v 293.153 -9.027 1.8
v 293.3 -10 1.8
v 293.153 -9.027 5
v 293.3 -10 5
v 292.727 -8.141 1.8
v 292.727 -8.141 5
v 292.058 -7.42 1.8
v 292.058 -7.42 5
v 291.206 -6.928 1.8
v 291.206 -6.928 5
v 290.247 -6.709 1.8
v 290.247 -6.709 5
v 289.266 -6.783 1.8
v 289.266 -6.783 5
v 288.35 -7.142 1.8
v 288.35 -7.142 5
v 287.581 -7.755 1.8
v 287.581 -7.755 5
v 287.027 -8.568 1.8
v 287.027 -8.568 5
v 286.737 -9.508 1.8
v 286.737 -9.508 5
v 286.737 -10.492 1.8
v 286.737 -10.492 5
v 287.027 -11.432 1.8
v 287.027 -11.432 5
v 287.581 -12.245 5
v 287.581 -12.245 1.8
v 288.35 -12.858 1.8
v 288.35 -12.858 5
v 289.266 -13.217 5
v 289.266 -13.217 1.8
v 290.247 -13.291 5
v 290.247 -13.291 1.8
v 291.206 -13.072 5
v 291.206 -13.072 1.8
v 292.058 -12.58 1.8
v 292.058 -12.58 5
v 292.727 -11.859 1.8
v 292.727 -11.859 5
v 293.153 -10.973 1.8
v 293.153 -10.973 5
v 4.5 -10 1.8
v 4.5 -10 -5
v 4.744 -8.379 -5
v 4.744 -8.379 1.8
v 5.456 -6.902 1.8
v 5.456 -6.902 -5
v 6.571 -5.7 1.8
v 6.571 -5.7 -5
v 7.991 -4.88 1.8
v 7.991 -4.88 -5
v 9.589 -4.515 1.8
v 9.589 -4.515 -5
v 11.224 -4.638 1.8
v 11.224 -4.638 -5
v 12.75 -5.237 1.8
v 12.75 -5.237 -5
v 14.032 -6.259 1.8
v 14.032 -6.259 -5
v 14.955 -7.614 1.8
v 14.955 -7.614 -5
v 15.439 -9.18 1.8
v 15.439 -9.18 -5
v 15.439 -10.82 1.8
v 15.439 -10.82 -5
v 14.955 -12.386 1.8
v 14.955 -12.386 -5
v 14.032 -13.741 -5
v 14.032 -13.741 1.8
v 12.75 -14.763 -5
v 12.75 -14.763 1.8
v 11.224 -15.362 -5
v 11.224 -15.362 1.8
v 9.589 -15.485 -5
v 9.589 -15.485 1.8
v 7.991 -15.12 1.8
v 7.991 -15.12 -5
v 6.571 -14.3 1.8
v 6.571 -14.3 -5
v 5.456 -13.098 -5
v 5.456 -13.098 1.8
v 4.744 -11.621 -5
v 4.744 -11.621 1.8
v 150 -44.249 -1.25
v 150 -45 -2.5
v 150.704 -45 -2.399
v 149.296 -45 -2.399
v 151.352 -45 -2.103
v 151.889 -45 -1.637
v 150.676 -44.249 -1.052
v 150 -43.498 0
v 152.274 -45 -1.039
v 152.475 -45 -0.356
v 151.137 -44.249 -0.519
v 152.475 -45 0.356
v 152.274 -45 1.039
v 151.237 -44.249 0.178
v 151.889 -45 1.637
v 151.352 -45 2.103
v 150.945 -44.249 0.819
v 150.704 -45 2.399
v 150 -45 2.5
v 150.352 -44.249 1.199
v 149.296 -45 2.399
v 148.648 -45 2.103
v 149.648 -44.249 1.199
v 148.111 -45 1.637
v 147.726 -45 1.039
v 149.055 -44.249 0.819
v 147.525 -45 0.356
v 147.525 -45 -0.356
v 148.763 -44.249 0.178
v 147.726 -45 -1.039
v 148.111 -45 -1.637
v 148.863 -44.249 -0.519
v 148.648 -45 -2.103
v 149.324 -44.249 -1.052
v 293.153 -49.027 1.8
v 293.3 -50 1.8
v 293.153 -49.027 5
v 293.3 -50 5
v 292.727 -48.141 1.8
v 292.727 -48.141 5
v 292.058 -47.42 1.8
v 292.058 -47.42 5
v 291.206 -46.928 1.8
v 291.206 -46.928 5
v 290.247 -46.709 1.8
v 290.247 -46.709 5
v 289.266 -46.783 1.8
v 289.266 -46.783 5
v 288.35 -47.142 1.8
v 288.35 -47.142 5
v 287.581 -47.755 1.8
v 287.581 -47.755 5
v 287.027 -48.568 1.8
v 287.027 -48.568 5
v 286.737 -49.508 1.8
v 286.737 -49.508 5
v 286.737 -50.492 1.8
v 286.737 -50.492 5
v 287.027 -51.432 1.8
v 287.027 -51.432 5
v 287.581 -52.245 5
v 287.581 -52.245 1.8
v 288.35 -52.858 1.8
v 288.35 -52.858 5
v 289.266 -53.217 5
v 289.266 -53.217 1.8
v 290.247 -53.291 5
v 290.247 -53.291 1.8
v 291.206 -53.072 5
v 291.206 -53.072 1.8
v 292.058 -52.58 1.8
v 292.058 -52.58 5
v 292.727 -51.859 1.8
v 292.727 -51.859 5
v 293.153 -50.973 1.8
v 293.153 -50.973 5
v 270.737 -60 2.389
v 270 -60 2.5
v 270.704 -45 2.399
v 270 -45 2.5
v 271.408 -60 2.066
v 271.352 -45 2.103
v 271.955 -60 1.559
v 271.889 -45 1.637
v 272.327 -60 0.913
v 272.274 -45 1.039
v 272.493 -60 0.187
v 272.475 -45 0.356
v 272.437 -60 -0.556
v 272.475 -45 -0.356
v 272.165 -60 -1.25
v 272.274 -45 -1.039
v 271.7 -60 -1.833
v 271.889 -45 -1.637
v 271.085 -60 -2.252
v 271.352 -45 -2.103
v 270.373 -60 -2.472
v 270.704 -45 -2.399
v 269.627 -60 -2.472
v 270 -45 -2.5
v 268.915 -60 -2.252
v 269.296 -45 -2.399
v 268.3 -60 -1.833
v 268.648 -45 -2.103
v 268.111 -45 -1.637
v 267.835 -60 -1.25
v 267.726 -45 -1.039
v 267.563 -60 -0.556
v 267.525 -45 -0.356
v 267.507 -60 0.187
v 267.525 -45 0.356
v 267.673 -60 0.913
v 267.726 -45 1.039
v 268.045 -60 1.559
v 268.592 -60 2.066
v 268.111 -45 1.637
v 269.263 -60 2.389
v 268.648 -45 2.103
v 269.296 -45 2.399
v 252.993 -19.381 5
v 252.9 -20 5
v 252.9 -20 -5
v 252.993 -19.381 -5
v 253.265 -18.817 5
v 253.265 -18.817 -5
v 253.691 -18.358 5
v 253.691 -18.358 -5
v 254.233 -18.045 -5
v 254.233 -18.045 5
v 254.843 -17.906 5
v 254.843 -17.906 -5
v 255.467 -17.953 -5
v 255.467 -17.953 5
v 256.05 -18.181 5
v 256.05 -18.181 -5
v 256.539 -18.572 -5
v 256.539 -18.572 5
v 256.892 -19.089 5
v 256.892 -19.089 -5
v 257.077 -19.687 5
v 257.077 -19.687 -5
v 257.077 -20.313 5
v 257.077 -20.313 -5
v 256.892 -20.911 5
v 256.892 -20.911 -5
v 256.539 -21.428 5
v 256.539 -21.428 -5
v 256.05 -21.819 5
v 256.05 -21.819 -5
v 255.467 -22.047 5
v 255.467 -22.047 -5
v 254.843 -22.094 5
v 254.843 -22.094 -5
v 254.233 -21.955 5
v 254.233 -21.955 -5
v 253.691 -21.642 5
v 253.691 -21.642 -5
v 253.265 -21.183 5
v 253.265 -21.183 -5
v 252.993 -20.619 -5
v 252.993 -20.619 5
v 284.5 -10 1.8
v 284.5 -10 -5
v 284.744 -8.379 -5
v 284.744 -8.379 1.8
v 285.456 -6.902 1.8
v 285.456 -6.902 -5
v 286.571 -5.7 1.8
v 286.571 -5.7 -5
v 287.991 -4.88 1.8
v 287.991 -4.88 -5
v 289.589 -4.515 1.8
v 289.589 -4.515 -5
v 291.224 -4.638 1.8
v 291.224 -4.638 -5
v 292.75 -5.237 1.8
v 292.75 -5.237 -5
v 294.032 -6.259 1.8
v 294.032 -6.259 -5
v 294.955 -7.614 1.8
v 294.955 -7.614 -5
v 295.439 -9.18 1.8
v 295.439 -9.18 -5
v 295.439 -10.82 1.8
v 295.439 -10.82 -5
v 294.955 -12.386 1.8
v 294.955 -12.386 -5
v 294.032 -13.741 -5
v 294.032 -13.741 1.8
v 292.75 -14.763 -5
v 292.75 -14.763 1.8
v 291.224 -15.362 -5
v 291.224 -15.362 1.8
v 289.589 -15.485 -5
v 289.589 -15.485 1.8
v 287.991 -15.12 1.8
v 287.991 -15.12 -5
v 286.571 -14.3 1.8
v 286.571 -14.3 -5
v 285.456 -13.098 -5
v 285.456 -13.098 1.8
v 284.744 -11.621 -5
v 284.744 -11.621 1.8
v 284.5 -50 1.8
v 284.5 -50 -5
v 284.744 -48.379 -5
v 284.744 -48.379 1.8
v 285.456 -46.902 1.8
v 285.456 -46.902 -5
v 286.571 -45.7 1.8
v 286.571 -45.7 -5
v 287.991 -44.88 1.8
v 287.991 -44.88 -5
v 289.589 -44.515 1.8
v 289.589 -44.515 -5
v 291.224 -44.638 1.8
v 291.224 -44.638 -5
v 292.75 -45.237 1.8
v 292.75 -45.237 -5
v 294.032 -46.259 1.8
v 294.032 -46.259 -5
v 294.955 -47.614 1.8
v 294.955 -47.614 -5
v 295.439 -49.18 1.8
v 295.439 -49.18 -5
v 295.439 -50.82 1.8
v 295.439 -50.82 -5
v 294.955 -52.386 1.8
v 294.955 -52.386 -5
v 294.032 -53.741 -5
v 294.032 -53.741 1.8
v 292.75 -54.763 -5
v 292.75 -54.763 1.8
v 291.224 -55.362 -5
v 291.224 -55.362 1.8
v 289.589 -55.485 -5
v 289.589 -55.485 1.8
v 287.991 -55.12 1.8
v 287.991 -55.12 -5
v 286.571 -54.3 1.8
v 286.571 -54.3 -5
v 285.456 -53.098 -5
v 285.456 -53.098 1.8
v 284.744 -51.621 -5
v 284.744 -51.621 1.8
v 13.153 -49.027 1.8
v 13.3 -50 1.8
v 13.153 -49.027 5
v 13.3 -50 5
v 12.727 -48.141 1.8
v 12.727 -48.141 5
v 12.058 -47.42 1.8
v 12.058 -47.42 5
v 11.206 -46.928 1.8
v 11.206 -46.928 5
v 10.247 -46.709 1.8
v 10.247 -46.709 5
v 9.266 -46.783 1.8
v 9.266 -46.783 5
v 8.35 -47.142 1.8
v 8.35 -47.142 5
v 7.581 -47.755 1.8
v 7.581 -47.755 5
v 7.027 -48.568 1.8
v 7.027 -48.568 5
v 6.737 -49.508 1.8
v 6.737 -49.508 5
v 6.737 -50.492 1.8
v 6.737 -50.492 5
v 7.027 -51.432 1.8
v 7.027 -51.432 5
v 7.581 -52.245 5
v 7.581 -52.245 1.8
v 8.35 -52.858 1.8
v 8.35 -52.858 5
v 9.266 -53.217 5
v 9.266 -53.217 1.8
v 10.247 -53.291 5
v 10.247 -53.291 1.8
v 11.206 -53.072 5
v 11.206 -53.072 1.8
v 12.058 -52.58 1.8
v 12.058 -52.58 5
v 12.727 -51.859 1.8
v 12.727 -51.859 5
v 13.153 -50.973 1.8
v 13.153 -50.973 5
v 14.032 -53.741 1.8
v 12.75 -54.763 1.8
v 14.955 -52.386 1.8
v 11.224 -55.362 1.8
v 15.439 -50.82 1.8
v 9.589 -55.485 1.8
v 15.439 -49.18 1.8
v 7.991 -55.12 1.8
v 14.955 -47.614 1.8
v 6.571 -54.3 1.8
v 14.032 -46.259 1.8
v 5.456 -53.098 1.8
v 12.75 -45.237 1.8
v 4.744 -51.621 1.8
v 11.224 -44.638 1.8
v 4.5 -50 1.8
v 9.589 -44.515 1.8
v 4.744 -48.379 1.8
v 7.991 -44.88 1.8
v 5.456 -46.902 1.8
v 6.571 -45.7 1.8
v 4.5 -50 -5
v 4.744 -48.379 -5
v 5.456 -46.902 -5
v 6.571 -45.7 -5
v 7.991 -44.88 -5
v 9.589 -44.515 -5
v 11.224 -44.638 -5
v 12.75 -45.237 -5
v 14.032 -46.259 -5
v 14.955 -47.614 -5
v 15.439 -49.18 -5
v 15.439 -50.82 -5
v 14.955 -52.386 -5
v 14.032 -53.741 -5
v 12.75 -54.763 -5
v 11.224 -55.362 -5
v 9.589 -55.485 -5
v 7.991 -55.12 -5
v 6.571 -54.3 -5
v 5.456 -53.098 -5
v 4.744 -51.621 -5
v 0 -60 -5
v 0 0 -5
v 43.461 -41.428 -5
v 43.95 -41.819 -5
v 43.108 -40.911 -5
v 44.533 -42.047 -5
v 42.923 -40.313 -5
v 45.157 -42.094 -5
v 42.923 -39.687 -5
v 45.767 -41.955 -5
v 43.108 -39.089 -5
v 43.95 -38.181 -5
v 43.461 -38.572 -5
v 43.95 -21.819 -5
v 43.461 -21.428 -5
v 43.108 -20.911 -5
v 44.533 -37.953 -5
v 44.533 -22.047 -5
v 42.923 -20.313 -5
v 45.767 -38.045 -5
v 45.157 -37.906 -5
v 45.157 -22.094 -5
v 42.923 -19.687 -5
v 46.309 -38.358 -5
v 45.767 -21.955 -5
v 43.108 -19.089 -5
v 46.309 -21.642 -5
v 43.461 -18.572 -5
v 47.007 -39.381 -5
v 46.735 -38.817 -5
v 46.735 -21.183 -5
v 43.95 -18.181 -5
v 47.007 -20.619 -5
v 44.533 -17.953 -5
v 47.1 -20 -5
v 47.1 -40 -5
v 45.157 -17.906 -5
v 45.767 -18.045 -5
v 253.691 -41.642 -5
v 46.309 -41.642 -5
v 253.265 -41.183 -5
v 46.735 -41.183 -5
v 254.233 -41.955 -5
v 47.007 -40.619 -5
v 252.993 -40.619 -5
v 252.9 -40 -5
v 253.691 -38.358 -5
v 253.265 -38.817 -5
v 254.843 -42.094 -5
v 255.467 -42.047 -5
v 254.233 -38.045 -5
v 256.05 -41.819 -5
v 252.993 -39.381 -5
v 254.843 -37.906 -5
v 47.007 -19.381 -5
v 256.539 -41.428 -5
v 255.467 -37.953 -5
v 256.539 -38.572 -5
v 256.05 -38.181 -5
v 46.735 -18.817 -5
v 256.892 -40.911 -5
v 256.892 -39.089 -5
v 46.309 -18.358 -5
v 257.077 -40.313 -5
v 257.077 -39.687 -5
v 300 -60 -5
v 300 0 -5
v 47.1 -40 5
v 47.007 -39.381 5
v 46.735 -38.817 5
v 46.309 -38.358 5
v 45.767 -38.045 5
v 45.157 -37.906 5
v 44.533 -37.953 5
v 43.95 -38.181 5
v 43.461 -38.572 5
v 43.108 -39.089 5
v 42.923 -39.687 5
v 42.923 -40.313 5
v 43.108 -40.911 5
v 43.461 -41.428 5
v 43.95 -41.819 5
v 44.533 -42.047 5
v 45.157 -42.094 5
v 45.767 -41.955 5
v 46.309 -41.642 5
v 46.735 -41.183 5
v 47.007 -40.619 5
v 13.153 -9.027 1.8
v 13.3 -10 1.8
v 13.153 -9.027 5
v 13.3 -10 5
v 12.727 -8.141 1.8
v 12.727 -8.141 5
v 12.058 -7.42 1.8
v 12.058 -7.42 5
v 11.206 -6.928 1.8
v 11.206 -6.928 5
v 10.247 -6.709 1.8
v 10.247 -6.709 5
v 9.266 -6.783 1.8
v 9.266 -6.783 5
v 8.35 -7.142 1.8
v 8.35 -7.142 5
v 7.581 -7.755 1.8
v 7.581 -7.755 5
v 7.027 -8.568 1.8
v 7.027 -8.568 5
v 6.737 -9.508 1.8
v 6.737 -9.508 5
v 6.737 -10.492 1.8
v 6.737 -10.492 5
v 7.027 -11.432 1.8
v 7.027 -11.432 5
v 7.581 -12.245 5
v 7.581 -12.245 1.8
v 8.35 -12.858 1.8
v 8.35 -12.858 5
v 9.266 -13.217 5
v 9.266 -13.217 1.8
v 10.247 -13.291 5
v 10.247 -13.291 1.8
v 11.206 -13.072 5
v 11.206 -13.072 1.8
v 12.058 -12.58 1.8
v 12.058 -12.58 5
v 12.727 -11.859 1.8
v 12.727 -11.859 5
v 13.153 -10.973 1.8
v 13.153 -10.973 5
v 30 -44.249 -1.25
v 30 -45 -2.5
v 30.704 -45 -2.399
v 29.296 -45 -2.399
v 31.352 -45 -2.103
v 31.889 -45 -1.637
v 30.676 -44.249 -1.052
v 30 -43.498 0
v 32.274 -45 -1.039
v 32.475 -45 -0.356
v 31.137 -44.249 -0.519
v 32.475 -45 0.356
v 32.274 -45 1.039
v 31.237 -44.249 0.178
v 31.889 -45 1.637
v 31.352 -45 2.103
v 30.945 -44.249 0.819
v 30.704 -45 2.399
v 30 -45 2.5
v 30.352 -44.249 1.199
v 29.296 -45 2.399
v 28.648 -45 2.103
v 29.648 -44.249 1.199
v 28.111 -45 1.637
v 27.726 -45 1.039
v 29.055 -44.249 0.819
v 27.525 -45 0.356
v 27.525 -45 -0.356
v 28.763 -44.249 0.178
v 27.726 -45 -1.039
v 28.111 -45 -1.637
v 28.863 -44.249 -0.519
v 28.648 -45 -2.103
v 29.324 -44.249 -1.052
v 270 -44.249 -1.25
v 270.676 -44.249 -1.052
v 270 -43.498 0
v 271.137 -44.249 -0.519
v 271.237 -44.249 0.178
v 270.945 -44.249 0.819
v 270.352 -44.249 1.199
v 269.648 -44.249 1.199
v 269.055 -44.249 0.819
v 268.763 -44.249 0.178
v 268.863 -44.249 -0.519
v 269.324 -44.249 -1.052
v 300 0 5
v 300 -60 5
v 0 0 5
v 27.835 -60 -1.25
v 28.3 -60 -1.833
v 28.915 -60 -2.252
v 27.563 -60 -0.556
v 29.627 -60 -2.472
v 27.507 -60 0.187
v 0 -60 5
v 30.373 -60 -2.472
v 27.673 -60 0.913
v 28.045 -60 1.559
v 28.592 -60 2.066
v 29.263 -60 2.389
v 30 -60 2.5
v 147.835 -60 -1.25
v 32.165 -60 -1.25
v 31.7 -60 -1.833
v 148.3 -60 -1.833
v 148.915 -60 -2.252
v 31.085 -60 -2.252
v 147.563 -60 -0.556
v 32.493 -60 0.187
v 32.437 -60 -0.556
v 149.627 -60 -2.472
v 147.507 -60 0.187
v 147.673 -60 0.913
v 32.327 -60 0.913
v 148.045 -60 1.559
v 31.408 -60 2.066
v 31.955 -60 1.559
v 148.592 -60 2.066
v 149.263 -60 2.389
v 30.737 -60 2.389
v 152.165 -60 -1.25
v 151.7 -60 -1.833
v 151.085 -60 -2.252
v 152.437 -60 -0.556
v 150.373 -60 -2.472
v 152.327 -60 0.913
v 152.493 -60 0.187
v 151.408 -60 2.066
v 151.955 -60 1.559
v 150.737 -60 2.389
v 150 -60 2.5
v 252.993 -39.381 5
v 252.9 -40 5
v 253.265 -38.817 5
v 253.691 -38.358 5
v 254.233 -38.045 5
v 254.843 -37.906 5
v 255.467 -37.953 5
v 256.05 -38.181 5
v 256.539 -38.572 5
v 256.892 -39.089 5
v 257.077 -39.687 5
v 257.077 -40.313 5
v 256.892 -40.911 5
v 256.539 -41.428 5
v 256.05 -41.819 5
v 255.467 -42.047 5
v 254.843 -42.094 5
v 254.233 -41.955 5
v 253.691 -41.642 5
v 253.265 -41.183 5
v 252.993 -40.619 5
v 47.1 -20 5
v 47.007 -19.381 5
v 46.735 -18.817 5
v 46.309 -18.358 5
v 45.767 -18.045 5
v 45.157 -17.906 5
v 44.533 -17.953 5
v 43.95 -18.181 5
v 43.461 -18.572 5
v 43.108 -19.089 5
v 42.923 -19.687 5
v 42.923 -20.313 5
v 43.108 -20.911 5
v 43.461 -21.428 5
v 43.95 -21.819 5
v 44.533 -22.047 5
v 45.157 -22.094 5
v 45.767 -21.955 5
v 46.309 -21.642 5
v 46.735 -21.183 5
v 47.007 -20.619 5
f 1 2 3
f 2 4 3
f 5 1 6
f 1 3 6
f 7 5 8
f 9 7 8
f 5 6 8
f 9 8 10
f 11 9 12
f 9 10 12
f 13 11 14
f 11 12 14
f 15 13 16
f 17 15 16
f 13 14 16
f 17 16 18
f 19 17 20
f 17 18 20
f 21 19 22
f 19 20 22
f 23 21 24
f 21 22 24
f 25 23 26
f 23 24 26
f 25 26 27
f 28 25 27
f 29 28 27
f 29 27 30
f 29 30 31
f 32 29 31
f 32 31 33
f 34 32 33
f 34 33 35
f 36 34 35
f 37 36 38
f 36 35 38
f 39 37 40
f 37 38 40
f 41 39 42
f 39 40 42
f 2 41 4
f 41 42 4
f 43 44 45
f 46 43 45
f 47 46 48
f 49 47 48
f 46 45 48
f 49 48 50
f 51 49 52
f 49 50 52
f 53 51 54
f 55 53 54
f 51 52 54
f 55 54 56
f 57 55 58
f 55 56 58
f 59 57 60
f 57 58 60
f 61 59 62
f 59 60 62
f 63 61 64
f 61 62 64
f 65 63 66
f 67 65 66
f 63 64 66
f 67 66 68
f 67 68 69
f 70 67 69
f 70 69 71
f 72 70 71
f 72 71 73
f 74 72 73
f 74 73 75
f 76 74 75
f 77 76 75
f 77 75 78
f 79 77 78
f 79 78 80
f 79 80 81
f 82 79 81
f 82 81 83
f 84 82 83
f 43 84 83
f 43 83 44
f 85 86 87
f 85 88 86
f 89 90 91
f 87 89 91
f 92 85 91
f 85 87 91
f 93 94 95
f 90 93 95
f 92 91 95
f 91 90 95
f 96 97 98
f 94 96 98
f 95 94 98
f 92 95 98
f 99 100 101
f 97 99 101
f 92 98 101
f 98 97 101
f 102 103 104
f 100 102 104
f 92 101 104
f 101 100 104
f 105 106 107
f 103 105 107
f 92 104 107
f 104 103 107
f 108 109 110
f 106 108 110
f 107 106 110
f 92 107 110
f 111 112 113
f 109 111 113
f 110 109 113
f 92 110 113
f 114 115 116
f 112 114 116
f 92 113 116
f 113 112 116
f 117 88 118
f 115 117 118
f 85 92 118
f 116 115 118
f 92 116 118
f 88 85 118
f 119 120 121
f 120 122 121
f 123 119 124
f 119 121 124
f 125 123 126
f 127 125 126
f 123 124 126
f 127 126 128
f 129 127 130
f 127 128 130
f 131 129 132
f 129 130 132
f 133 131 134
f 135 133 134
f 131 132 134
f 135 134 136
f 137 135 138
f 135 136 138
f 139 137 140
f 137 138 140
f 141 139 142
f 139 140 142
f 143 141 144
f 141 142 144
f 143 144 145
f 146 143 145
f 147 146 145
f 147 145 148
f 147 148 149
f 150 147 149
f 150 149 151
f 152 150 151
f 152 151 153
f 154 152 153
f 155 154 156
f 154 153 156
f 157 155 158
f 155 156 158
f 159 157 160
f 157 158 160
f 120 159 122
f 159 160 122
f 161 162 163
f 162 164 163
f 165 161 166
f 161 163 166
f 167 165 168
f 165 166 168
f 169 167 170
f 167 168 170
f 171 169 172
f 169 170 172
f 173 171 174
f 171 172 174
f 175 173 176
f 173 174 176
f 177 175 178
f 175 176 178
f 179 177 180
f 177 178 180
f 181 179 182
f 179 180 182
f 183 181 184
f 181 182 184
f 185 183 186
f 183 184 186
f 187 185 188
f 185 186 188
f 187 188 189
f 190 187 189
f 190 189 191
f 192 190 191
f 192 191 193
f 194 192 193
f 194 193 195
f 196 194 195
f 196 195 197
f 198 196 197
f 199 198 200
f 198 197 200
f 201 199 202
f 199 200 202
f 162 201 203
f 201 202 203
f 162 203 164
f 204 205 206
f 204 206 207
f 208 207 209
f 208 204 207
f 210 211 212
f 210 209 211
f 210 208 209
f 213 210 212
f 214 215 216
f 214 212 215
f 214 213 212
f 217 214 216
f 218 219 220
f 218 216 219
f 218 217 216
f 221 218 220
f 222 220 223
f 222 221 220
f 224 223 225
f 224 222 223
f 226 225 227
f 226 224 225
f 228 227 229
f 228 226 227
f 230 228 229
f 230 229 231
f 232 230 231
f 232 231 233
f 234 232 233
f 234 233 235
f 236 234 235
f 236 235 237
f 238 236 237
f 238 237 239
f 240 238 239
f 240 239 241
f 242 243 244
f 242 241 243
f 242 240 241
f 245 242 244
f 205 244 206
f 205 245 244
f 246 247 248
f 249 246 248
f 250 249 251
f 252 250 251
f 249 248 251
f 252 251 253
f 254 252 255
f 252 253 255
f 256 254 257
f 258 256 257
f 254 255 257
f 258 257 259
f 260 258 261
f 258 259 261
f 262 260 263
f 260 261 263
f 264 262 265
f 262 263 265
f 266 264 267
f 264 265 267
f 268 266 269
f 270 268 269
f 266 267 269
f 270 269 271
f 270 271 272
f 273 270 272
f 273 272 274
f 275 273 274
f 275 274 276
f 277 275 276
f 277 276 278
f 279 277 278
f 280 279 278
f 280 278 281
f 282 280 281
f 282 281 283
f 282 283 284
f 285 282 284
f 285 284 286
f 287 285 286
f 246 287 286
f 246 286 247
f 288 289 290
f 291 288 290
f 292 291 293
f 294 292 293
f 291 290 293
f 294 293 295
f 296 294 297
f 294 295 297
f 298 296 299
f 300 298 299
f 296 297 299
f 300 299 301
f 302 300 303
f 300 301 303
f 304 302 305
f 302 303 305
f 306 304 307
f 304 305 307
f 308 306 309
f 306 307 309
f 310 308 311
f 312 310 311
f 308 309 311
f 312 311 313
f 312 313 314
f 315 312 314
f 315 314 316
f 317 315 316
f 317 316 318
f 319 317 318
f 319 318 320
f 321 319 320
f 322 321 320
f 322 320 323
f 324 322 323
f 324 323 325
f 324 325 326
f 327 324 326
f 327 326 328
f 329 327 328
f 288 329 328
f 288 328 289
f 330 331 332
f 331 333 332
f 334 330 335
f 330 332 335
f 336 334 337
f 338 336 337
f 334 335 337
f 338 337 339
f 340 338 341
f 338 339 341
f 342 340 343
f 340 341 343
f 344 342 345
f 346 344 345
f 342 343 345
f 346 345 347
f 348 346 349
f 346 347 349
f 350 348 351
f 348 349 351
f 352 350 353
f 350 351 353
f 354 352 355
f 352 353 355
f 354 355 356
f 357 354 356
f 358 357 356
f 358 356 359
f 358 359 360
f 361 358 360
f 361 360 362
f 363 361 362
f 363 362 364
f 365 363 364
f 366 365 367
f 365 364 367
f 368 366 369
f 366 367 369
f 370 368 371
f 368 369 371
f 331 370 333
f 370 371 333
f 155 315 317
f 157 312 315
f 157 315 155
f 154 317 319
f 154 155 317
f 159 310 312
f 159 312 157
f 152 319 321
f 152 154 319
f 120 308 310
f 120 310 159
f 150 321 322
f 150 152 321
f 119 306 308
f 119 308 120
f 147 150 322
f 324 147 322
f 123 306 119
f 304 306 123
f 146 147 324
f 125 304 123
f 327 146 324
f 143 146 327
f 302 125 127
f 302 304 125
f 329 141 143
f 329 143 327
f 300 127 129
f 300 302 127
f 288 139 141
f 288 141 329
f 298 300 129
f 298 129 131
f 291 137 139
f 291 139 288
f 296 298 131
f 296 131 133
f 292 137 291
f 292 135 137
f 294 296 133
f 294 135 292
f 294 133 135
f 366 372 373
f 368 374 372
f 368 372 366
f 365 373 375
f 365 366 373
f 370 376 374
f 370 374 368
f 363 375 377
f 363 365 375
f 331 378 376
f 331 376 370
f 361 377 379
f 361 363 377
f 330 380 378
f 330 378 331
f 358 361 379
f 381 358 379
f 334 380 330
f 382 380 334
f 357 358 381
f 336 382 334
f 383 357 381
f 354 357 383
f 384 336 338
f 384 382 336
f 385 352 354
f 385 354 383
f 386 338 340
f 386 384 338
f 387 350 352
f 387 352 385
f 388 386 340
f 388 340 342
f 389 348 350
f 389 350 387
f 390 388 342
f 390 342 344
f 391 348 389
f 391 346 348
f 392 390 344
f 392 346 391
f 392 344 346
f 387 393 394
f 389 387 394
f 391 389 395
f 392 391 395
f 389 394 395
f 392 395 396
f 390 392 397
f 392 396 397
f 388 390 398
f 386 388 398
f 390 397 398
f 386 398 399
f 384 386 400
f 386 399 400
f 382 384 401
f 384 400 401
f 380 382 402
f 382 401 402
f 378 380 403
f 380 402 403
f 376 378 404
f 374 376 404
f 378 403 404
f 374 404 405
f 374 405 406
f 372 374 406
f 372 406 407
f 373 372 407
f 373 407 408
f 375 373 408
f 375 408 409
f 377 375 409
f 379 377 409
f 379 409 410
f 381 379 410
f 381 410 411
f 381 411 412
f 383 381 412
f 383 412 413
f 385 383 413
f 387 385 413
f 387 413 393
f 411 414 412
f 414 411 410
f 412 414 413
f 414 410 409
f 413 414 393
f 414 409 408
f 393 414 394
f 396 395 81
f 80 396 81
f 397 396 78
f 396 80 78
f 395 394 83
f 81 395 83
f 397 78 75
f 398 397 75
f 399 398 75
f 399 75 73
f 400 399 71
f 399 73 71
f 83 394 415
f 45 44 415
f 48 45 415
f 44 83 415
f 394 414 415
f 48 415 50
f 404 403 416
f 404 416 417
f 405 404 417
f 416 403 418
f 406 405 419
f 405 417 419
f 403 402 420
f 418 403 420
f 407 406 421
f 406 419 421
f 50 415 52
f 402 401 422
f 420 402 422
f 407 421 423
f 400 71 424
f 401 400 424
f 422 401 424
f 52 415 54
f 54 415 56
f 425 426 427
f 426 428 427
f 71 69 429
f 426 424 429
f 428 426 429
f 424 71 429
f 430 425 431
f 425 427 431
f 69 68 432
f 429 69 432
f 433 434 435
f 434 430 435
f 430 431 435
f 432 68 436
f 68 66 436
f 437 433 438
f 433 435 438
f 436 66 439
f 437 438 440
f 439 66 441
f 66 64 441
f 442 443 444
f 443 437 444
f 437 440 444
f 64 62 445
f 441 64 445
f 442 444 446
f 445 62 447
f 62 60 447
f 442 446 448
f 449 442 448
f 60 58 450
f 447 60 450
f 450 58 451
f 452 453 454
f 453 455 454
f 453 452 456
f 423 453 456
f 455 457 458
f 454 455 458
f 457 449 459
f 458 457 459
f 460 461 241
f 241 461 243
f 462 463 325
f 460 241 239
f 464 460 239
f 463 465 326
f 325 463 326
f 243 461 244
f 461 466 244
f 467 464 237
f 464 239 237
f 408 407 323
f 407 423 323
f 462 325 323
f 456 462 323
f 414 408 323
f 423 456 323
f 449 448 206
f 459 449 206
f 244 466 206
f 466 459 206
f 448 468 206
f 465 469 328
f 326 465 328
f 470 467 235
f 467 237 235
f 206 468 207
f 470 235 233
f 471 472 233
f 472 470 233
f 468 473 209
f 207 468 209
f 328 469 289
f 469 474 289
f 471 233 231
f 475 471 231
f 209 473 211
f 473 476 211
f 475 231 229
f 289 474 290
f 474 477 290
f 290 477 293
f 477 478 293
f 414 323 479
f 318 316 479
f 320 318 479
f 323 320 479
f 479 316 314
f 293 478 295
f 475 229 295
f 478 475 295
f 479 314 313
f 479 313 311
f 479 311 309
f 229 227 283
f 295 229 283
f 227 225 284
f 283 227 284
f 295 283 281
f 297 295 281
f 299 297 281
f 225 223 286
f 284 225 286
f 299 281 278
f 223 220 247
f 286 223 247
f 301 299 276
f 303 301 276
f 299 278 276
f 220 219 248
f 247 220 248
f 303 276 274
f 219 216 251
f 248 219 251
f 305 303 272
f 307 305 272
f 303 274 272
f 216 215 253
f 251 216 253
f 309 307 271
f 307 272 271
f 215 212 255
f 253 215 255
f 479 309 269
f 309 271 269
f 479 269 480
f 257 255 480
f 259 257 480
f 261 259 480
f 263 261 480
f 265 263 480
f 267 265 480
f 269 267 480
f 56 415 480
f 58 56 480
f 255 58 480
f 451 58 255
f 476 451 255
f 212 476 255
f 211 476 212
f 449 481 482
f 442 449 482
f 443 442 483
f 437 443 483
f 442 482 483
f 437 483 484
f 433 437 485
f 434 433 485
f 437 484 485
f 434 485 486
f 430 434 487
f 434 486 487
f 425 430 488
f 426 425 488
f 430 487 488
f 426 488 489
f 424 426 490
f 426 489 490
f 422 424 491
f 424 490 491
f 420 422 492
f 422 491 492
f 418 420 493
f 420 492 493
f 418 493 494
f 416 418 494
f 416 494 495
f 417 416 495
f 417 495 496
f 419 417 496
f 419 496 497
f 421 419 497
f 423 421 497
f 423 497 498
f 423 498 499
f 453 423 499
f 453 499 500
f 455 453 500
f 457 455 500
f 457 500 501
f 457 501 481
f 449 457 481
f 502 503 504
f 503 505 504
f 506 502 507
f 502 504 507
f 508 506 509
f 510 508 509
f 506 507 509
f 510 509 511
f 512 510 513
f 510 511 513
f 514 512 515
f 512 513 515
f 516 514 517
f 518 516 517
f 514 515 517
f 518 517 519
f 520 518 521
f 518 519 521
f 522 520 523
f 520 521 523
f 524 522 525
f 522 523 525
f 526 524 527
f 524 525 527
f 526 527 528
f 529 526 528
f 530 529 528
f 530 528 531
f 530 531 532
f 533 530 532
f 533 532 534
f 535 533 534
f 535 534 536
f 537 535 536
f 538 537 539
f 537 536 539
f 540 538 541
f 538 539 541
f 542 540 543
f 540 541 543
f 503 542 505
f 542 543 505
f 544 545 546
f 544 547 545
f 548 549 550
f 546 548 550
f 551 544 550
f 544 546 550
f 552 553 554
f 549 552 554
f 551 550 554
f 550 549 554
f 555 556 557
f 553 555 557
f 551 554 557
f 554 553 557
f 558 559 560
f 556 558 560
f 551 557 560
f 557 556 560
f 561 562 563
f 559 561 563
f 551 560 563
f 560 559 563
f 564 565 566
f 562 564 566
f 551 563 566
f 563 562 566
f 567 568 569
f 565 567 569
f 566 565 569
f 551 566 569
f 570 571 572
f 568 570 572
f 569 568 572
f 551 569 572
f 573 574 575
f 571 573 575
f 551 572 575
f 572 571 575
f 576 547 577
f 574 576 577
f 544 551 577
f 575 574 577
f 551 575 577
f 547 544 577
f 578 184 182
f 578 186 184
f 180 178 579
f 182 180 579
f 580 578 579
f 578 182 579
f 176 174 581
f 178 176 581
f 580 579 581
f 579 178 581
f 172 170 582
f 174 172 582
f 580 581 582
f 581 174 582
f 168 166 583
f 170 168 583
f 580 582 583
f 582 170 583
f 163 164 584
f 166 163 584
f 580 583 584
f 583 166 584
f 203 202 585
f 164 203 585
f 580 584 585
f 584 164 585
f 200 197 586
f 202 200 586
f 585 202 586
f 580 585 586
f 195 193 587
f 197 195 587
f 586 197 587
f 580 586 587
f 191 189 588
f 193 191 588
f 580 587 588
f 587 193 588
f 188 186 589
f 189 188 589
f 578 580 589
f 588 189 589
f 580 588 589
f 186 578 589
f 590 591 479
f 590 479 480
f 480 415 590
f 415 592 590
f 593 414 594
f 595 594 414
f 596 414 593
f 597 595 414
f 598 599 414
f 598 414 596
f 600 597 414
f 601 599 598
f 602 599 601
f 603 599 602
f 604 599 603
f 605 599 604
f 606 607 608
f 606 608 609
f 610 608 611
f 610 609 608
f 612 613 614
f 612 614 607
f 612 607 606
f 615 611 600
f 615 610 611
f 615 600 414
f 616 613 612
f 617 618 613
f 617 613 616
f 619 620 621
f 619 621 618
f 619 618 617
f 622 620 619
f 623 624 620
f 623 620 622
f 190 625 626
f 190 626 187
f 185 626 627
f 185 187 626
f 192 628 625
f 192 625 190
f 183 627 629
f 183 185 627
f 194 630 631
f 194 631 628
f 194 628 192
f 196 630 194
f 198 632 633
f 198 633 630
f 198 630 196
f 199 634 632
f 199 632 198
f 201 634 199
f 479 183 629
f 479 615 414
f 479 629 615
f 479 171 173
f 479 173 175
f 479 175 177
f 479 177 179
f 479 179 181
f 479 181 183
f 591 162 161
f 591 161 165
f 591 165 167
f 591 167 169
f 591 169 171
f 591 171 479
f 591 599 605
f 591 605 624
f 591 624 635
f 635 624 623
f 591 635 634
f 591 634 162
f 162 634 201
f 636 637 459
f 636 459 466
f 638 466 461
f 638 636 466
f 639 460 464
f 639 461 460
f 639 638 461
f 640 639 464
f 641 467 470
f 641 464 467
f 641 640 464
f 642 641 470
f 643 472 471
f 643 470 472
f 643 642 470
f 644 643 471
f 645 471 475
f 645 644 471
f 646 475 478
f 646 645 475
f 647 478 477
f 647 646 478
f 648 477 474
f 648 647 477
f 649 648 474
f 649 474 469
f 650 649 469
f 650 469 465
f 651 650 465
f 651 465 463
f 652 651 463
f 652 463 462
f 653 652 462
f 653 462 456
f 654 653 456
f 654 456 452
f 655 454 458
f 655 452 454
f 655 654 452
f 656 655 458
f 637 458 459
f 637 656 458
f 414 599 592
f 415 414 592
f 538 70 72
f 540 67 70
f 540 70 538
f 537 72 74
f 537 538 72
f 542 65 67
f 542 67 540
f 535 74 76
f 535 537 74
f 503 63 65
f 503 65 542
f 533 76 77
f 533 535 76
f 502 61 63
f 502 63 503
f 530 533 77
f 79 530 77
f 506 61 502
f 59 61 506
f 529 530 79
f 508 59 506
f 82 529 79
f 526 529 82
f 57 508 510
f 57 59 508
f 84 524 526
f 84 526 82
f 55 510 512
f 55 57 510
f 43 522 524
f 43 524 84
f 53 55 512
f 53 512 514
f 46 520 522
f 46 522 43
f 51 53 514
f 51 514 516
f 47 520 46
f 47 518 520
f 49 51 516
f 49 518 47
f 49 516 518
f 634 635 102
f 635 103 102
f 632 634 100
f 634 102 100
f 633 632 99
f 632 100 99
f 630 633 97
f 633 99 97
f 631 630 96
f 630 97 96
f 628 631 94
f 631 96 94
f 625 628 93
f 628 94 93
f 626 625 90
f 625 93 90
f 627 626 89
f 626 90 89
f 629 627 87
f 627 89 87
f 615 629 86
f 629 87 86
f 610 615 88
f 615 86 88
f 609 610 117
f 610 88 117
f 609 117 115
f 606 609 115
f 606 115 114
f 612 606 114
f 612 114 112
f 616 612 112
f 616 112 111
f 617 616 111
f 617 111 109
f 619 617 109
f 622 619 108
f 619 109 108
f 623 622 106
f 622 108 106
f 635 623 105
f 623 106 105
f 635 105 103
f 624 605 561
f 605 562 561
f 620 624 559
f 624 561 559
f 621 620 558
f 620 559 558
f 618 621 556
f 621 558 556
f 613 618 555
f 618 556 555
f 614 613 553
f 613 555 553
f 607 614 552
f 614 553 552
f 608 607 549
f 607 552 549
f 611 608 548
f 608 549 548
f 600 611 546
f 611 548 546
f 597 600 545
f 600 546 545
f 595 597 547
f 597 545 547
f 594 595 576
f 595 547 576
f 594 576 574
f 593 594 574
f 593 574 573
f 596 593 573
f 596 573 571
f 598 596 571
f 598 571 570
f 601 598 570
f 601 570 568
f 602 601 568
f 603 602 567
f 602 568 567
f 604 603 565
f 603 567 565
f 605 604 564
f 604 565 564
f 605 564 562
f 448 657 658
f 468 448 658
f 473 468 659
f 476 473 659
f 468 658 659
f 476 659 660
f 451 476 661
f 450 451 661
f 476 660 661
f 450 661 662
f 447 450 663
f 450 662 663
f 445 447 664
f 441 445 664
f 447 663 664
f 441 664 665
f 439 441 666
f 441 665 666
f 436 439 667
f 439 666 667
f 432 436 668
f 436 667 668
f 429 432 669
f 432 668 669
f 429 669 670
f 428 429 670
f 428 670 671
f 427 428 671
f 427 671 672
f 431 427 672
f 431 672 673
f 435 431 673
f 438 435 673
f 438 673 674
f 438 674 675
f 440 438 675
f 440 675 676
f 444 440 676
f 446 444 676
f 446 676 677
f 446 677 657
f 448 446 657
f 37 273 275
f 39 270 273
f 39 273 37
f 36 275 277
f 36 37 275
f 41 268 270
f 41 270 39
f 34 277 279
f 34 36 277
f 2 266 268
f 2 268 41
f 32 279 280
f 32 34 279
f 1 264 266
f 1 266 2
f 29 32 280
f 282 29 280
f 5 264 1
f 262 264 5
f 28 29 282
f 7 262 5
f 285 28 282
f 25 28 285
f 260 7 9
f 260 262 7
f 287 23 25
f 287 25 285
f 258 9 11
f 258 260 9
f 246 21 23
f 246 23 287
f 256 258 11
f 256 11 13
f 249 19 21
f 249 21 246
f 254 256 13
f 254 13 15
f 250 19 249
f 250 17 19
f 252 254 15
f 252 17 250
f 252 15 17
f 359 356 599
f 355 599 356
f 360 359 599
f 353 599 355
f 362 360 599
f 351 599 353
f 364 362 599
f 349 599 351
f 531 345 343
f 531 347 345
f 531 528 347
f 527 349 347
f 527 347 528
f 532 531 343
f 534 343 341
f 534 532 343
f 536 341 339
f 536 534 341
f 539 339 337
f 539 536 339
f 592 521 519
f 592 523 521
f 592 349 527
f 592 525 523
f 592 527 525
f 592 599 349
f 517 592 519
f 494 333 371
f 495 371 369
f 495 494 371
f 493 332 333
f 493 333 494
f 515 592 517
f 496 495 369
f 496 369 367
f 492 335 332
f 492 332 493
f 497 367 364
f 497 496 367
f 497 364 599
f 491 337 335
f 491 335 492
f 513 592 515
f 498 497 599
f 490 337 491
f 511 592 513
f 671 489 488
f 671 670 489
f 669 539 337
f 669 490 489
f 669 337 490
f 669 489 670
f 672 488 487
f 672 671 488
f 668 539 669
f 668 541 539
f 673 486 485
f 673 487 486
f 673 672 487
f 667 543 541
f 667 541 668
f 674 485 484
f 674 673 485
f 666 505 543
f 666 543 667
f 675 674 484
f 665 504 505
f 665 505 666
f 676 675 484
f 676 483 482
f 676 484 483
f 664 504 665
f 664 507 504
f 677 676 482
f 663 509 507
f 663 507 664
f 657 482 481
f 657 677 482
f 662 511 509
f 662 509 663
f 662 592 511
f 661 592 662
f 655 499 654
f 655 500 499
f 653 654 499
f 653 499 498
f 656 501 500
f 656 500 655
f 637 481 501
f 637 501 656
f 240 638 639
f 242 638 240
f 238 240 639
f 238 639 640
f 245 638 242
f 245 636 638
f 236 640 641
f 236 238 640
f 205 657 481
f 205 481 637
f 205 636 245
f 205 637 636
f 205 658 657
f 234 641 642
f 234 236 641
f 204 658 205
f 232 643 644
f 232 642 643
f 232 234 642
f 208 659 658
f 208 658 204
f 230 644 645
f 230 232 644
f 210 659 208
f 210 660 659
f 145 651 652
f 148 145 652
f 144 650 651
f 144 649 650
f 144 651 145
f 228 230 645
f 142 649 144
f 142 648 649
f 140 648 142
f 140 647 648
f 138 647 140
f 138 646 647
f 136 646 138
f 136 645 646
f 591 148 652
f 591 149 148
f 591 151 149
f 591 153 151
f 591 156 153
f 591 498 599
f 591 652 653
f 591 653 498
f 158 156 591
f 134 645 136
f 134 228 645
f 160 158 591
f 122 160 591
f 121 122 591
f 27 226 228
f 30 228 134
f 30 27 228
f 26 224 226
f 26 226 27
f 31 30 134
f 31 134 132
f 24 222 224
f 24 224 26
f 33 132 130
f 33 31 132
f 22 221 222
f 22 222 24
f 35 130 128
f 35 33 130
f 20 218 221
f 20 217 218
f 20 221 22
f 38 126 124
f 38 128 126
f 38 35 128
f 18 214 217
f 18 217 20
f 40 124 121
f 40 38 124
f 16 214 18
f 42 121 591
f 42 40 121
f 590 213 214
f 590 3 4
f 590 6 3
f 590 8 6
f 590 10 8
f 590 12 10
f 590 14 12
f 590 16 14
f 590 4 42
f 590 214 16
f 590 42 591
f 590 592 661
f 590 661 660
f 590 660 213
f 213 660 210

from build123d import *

# Parameters (mm, degrees)
SKETCH_1_W                = 300
SKETCH_1_H                = 60
EXTRUDE_1_DEPTH           = 5
HOLE_WIZARD_M6_1_D        = 5
HOLE_WIZARD_M6_1_DEPTH    = 15
HOLE_WIZARD_M6_1_TIP      = 1.502151548
HOLE_WIZARD_1_D           = 6.6
HOLE_WIZARD_1_CBORE_D     = 11
HOLE_WIZARD_1_CBORE_DEPTH = 6.8
HOLE_WIZARD_M5_1_D        = 4.2


with BuildPart() as part:
    # 草图1 → 凸台-拉伸1 (new body, symmetric)
    with BuildSketch(Plane.XY):
        with Locations((150, -30)):
            Rectangle(SKETCH_1_W, SKETCH_1_H)
    extrude(amount=EXTRUDE_1_DEPTH, both=True)

    # M6 螺纹孔1
    with Locations(Plane(origin=(30, -60, 0), x_dir=(0, 0, -1), z_dir=(0, -1, 0))):
        with Locations((0, 0), (0, 240), (0, 120)):
            Hole(HOLE_WIZARD_M6_1_D / 2, depth=HOLE_WIZARD_M6_1_DEPTH)
            with Locations((0, 0, -(HOLE_WIZARD_M6_1_DEPTH + HOLE_WIZARD_M6_1_TIP / 2))):  # 118° drill point
                Cone(0, HOLE_WIZARD_M6_1_D / 2, HOLE_WIZARD_M6_1_TIP, mode=Mode.SUBTRACT)

    # 打孔尺寸(%根据)内六角圆柱头螺钉的类型1 (through all)
    with Locations(Plane(origin=(10, -10, -5), x_dir=(-1, 0, 0), z_dir=(0, 0, -1))):
        with Locations((0, 0), (0, -40), (-280, 0), (-280, -40)):
            CounterBoreHole(HOLE_WIZARD_1_D / 2, HOLE_WIZARD_1_CBORE_D / 2, HOLE_WIZARD_1_CBORE_DEPTH)

    # M5 螺纹孔1 (through all)
    with Locations(Plane(origin=(45, -20, -5), x_dir=(-1, 0, 0), z_dir=(0, 0, -1))):
        with Locations((0, 0), (0, -20)):
            hole_wizard_m5_1 = Hole(HOLE_WIZARD_M5_1_D / 2)

    # 镜向1: M5 螺纹孔1 across plane
    add(hole_wizard_m5_1.mirror(Plane(origin=(150, 0, 0), x_dir=(0, 0, 1), z_dir=(1, 0, 0))), mode=Mode.SUBTRACT)


solid = part.part
